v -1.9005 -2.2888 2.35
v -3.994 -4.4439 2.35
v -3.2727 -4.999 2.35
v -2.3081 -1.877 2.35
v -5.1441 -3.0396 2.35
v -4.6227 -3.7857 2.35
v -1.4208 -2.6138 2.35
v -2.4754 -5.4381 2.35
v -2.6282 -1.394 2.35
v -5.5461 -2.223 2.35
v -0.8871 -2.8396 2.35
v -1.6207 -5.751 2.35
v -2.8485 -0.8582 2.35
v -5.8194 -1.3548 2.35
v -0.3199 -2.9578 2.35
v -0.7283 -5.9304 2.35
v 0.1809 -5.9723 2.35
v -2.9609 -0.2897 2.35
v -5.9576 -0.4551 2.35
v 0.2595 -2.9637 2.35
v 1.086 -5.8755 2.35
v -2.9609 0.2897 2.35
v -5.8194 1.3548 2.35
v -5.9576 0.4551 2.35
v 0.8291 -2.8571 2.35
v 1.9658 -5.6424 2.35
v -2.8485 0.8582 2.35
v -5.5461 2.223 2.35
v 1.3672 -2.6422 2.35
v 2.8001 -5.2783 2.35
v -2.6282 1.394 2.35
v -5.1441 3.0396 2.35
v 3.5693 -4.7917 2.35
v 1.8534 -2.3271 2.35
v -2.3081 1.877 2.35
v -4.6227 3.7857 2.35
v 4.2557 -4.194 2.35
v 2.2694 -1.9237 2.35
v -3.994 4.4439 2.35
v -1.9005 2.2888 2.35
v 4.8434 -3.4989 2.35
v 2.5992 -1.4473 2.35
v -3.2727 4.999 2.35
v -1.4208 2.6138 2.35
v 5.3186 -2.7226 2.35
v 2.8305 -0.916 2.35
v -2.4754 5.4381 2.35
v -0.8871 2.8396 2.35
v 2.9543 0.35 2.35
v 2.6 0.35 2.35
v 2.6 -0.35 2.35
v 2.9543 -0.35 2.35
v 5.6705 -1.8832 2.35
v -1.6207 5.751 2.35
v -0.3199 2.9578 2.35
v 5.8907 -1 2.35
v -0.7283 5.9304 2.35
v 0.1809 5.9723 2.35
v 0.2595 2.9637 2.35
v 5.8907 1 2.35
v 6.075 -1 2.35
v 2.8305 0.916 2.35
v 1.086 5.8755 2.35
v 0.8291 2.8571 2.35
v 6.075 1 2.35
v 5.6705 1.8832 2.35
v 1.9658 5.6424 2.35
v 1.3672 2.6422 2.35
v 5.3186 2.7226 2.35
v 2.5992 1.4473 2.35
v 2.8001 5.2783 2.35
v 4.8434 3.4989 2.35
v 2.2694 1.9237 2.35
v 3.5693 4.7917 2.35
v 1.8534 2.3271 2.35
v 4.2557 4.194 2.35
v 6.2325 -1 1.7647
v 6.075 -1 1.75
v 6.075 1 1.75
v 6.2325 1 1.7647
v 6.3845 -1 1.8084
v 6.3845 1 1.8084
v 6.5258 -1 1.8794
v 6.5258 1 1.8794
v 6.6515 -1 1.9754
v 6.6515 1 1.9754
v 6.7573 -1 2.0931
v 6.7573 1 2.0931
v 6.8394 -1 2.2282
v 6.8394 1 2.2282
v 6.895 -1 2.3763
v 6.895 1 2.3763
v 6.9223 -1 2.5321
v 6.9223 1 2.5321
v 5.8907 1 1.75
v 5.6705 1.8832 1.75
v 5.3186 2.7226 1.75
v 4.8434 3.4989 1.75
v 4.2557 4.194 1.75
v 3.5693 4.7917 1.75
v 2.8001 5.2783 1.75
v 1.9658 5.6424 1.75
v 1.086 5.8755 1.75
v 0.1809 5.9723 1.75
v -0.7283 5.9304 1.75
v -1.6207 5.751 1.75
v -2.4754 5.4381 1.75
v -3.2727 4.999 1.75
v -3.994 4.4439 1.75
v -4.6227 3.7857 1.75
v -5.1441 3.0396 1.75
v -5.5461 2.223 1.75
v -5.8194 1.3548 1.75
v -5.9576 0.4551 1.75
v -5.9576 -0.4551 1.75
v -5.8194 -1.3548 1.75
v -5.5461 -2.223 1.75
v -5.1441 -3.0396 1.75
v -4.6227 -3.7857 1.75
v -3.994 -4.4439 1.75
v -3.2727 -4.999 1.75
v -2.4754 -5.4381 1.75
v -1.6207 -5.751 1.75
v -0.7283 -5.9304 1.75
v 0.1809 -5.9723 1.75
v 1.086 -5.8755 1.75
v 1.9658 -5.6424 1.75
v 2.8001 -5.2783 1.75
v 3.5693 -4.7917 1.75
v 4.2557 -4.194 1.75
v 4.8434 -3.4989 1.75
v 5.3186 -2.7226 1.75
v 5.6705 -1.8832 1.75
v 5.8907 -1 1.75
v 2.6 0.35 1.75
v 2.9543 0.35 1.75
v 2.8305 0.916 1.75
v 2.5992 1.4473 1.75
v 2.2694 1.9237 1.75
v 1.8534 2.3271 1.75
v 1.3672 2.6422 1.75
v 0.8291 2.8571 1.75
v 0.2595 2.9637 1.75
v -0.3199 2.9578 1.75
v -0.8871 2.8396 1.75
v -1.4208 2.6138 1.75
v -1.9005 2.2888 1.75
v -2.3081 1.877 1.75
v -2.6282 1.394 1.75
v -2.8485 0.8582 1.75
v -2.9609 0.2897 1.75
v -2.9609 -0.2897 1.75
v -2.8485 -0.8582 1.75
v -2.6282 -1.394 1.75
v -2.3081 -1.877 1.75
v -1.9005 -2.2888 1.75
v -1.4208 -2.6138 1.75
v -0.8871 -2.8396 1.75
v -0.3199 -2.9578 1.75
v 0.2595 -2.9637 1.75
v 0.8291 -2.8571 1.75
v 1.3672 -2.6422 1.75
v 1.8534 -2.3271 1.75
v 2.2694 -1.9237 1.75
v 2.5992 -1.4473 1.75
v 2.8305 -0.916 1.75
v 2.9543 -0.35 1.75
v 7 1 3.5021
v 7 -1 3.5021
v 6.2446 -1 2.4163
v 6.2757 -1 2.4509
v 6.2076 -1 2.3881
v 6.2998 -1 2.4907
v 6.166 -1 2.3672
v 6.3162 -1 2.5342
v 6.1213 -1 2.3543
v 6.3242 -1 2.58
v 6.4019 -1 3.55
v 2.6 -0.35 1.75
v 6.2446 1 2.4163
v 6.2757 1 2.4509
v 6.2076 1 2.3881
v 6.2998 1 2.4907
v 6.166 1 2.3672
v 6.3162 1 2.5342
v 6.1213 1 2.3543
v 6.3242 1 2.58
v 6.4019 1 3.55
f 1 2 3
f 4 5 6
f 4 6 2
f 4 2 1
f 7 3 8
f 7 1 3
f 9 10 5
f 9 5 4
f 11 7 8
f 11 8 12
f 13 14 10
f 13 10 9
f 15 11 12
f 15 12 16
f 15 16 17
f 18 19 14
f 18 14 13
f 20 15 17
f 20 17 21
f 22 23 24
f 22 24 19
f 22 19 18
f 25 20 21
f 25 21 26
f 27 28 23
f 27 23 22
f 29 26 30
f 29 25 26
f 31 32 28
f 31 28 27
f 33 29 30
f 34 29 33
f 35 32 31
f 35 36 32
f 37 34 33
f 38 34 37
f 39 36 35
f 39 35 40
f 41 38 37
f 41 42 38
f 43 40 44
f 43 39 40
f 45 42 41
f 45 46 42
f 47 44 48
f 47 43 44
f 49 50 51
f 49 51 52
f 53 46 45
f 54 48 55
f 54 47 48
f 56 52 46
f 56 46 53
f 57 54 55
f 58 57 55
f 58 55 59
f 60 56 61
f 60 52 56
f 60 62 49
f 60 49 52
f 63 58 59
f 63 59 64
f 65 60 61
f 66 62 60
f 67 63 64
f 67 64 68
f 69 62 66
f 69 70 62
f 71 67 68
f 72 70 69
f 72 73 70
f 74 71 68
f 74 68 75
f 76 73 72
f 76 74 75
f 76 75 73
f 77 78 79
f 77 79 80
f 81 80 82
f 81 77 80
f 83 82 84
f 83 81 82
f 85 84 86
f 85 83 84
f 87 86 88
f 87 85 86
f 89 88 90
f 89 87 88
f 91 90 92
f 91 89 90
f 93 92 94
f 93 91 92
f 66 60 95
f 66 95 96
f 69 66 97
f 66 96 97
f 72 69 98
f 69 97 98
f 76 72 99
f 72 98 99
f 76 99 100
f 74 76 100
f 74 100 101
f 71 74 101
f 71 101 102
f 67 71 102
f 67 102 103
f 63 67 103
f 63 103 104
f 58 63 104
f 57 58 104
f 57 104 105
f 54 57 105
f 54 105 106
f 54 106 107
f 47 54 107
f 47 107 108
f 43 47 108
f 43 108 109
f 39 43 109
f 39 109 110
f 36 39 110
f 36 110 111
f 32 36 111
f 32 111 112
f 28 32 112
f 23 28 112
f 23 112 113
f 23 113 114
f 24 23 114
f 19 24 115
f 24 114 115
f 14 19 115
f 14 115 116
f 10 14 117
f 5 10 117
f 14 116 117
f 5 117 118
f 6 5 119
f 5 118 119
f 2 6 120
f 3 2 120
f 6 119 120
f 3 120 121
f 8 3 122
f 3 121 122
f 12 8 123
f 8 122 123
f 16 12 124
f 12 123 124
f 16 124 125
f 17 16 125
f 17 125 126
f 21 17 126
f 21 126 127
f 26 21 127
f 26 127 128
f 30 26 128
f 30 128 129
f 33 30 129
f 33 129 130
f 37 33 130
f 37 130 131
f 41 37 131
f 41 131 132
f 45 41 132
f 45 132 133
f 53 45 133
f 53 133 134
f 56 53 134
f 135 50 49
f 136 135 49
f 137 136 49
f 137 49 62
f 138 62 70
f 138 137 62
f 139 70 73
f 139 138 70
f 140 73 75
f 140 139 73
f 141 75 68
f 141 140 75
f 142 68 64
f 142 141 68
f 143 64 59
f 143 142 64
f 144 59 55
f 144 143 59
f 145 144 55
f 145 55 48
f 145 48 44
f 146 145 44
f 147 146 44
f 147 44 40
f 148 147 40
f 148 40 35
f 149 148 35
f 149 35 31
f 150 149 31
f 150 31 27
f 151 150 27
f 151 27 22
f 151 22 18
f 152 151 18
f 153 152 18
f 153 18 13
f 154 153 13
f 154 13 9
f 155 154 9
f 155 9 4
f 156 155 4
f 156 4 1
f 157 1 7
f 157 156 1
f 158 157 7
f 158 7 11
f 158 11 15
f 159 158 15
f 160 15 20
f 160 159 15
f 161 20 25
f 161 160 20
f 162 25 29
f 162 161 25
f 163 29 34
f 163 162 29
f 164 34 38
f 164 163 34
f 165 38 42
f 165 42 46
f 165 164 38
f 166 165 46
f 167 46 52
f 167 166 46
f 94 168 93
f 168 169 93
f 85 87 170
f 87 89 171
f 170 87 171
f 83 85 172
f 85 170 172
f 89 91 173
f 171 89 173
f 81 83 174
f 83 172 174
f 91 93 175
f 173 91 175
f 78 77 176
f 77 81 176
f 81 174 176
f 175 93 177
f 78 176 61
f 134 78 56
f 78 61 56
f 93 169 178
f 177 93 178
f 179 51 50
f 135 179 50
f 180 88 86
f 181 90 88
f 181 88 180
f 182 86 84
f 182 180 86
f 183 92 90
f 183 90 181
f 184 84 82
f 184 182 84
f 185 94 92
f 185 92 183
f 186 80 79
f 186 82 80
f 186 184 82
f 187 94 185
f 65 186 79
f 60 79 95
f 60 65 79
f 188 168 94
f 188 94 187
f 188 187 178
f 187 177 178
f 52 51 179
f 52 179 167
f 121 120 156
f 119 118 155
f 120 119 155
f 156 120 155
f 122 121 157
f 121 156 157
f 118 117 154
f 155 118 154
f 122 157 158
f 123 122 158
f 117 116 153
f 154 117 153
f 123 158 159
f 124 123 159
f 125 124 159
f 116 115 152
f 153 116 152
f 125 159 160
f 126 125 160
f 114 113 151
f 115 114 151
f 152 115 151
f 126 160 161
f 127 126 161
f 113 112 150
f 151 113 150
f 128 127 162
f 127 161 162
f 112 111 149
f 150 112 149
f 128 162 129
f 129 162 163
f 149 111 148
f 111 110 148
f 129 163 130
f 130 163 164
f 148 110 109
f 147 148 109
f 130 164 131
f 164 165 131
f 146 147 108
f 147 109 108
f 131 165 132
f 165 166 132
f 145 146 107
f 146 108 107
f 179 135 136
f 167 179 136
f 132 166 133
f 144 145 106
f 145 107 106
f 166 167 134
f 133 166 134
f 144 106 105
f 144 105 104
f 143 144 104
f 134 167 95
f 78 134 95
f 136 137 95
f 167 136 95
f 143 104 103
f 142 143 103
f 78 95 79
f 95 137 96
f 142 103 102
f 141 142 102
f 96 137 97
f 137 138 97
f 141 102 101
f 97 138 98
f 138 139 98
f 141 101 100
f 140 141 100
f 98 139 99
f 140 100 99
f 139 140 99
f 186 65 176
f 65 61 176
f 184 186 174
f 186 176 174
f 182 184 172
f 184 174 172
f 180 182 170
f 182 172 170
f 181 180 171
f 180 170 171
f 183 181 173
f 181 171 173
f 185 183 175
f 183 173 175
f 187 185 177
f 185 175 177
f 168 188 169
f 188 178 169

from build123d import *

# Parameters (mm, degrees)
SKETCH014_R   = 5.975
SKETCH014_R_2 = 2.975
PAD007_DEPTH  = 0.6
PAD008_DEPTH  = 1
SKETCH016_W   = 0.8
SKETCH016_H   = 0.7
PAD009_DEPTH  = 0.6


with BuildPart() as part:
    # Sketch014 → Pad007 (new body)
    with BuildSketch(Plane.XY):
        Circle(SKETCH014_R)
        Circle(SKETCH014_R_2, mode=Mode.SUBTRACT)
    extrude(amount=PAD007_DEPTH)

    # Sketch015 → Pad008 (join, symmetric)
    with BuildSketch(Plane.XZ):
        with BuildLine():
            Line((5.825, 0.6), (6.075, 0.6))
            ThreePointArc((6.075, 0.6), (6.244571, 0.6663), (6.324201, 0.830034))
            Line((6.324201, 0.830034), (6.401917, 1.8))
            Line((6.401917, 1.8), (7, 1.752081))
            Line((7, 1.752081), (6.922285, 0.782114))
            ThreePointArc((6.075, 0), (6.65154, 0.225419), (6.922285, 0.782114))
            Line((6.075, 0), (5.825, 0))
            Line((5.825, 0), (5.825, 0.6))
        make_face()
    extrude(amount=PAD008_DEPTH, both=True)

    # Sketch016 (on Face11 of Pad008) → Pad009 (join)
    with BuildSketch(Plane.XY.offset(0.6)):
        with Locations((3, 0)):
            Rectangle(SKETCH016_W, SKETCH016_H)
    extrude(amount=-PAD009_DEPTH)


with BuildPart() as part_1:
    # Body005 placement: moved
    add(part.part.moved(Location((0, 0, 1.75))))


solid = part_1.part
